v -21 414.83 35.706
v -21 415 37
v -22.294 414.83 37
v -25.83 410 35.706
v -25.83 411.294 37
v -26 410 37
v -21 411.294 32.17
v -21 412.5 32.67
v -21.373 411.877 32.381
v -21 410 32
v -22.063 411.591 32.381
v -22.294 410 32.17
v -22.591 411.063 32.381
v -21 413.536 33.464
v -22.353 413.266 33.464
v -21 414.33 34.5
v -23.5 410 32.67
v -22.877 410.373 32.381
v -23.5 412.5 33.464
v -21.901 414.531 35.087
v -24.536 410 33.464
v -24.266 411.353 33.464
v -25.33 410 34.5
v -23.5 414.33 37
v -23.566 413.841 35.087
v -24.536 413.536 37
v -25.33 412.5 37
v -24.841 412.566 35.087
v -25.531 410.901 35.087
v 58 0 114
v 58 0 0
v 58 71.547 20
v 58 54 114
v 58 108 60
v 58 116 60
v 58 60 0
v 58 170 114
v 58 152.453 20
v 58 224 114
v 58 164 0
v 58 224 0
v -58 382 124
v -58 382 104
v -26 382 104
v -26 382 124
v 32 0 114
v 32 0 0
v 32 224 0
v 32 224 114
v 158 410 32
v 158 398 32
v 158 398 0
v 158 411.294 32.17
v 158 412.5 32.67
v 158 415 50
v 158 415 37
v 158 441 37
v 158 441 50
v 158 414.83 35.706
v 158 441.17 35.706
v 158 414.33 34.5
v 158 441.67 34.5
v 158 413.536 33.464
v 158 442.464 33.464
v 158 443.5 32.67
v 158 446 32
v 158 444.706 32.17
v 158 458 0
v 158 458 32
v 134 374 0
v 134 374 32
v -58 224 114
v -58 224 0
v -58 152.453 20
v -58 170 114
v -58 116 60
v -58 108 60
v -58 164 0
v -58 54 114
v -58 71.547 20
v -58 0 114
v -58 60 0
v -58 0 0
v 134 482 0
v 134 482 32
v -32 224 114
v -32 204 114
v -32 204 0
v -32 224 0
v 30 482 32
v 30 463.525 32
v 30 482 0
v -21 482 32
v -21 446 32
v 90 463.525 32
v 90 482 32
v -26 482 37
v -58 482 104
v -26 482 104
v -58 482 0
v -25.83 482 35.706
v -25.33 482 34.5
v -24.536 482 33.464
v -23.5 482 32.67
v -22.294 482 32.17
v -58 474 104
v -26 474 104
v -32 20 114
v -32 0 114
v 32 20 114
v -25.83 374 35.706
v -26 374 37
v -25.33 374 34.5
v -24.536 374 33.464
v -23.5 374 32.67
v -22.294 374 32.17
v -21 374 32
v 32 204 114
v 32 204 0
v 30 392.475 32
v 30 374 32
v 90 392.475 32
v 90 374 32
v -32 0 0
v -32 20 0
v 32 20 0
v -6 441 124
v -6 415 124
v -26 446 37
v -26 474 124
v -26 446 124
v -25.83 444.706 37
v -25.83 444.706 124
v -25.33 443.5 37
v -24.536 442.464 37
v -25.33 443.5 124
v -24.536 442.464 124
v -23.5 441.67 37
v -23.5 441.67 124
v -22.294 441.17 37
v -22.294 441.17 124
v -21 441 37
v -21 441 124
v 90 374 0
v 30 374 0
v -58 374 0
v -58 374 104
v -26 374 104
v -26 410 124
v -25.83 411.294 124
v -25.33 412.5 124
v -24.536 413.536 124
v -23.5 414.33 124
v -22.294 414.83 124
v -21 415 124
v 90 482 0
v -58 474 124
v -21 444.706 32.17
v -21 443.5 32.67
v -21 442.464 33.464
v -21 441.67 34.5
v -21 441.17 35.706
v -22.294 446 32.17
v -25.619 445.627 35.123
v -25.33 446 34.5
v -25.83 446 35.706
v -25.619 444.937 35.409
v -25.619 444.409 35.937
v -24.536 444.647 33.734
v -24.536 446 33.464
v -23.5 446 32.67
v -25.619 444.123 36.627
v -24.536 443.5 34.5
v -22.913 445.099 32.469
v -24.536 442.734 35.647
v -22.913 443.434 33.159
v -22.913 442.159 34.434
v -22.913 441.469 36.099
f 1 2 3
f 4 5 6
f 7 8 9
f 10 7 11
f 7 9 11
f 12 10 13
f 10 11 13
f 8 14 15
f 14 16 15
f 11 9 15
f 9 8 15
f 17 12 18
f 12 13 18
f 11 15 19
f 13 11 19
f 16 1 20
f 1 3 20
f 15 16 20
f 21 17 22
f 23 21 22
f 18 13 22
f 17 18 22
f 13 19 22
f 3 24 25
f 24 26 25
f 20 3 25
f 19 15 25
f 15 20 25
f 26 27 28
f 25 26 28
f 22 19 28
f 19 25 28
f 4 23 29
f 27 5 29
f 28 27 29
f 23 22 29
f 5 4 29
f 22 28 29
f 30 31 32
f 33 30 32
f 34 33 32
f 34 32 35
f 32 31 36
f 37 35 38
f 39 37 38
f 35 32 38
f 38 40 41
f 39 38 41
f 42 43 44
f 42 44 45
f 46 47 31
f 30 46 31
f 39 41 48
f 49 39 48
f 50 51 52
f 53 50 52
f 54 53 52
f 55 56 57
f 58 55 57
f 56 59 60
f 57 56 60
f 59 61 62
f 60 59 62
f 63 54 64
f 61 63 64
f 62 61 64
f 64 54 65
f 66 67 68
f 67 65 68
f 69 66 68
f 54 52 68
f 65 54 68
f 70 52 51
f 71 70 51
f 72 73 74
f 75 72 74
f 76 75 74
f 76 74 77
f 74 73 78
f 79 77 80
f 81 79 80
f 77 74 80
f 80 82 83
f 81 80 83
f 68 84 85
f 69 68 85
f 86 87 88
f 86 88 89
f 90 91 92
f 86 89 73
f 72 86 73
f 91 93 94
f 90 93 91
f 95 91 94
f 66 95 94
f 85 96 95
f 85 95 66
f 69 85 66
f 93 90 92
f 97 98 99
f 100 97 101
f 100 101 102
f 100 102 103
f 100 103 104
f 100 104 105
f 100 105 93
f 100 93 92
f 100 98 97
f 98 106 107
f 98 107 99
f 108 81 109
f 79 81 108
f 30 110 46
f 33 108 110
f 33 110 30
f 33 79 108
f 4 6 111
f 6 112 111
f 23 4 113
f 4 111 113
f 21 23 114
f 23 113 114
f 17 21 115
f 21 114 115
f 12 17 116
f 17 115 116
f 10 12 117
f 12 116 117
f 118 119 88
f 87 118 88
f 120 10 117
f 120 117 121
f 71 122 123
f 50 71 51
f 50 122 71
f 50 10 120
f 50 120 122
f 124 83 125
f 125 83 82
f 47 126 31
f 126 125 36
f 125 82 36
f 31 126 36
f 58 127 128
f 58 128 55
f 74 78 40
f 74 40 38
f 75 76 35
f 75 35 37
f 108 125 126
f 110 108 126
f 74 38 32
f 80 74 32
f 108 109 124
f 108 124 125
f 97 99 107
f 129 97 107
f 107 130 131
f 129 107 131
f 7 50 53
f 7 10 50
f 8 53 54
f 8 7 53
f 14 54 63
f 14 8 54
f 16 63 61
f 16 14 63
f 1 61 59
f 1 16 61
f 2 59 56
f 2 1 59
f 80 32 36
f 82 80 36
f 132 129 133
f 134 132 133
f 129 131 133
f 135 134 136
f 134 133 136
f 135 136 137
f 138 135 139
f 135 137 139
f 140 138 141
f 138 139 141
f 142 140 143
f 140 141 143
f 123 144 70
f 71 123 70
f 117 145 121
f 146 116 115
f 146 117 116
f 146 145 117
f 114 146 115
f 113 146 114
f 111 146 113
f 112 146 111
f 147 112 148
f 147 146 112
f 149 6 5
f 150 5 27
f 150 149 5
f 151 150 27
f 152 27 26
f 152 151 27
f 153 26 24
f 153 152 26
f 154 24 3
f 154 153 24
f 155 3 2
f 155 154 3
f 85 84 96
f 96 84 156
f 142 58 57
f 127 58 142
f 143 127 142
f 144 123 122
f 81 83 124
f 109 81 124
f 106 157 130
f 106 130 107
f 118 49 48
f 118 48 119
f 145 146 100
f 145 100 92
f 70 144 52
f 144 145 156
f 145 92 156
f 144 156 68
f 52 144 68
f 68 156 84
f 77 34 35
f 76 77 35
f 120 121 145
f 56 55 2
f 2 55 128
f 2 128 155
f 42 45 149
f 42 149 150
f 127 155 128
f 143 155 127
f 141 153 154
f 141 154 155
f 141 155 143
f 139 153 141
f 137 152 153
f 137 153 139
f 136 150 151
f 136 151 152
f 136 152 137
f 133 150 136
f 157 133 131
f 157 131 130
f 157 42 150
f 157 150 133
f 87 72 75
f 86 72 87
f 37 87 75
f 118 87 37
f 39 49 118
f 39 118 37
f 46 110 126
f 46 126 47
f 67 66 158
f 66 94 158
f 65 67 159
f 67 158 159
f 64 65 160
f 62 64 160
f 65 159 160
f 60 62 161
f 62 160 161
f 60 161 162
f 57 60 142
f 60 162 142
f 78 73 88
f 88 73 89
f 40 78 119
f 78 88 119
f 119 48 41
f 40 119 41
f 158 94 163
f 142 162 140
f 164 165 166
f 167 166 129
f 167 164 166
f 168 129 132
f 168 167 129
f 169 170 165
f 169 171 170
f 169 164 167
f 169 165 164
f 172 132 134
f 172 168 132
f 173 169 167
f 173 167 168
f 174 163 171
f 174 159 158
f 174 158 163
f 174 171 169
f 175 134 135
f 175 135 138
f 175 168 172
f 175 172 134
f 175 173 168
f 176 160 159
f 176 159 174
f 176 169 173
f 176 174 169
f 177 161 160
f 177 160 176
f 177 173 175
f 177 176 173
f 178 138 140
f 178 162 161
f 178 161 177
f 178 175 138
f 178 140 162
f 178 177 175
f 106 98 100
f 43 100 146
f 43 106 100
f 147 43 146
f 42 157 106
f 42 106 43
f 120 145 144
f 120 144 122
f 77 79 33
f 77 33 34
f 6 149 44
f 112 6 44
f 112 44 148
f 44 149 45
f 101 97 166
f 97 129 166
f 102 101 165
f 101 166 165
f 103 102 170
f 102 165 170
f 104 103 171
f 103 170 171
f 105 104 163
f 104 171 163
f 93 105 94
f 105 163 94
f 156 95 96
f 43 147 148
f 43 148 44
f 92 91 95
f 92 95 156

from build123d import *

# Parameters (mm, degrees)
F1_DEPTH  = 114
F3_DEPTH  = 116.001
F5_DEPTH  = 32
F6_SIZE   = 24
F9_DEPTH  = 60
F11_DEPTH = 32
F14_DEPTH = 13
F15_R     = 5


with BuildPart() as f1:
    # F0 (on Top) → F1 (new body)
    with BuildSketch(Plane.XY):
        Polygon((-58, 0), (-32, 0), (-32, 20), (0, 20), (32, 20), (32, 0), (58, 0), (58, 54), (58, 170), (58, 224), (32, 224), (32, 204), (0, 204), (-32, 204), (-32, 224), (-58, 224), (-58, 170), (-58, 54), align=None)
    extrude(amount=F1_DEPTH)

    # F2 (on face) → F3 (cut, through all)
    with BuildSketch(Plane.YZ.offset(58)):
        Polygon((71.5470053838, 20), (60, 0), (164, 0), (152.4529946162, 20), align=None)
        Polygon((170, 114), (54, 114), (108, 60), (116, 60), align=None)
    extrude(amount=-F3_DEPTH, mode=Mode.SUBTRACT)


with BuildPart() as f5:
    # F4 (on Top) → F5 (new body)
    with BuildSketch(Plane.XY):
        Polygon((-58, 482), (-58, 374), (30, 374), (90, 374), (158, 374), (158, 482), (90, 482), (30, 482), align=None)
    extrude(amount=F5_DEPTH)

    # F6
    f6_edges = [f5.edges().sort_by_distance(p)[0] for p in [
        (158, 374, 16),
        (158, 482, 16),
    ]]
    chamfer(f6_edges, length=F6_SIZE)

    # F8 (on offset) → F9 (cut)
    with BuildSketch(Plane.YZ.offset(90)):
        Polygon((392.4752086141, 32), (374, 32), (374, 0), align=None)
        Polygon((482, 0), (482, 32), (463.5247913859, 32), align=None)
    extrude(amount=-F9_DEPTH, mode=Mode.SUBTRACT)

    # F10 (on face) → F11 (join)
    with BuildSketch(Plane(origin=(-58, 0, 0), x_dir=(0, -1, 0), z_dir=(-1, 0, 0))):
        Polygon((-482, 104), (-482, 32), (-374, 32), (-374, 104), (-382, 104), (-382, 124), (-474, 124), (-474, 104), align=None)
    extrude(amount=-F11_DEPTH)

    # F13 (on offset) → F14 (join, symmetric)
    with BuildSketch(Plane(origin=(0, 428, 0), x_dir=(-1, 0, 0), z_dir=(0, 1, 0))):
        Polygon((-134, 32), (26, 32), (26, 104), (26, 124), (6, 124), (-158, 50), (-158, 32), align=None)
    extrude(amount=F14_DEPTH, both=True)

    # F15
    f15_edges = [f5.edges().sort_by_distance(p)[0] for p in [
        (-26, 415, 78),
        (66, 415, 32),
        (-26, 394.5, 32),
        (66, 441, 32),
        (-26, 461.5, 32),
        (-26, 441, 78),
    ]]
    fillet(f15_edges, radius=F15_R)


solid = Compound([f1.part, f5.part])
